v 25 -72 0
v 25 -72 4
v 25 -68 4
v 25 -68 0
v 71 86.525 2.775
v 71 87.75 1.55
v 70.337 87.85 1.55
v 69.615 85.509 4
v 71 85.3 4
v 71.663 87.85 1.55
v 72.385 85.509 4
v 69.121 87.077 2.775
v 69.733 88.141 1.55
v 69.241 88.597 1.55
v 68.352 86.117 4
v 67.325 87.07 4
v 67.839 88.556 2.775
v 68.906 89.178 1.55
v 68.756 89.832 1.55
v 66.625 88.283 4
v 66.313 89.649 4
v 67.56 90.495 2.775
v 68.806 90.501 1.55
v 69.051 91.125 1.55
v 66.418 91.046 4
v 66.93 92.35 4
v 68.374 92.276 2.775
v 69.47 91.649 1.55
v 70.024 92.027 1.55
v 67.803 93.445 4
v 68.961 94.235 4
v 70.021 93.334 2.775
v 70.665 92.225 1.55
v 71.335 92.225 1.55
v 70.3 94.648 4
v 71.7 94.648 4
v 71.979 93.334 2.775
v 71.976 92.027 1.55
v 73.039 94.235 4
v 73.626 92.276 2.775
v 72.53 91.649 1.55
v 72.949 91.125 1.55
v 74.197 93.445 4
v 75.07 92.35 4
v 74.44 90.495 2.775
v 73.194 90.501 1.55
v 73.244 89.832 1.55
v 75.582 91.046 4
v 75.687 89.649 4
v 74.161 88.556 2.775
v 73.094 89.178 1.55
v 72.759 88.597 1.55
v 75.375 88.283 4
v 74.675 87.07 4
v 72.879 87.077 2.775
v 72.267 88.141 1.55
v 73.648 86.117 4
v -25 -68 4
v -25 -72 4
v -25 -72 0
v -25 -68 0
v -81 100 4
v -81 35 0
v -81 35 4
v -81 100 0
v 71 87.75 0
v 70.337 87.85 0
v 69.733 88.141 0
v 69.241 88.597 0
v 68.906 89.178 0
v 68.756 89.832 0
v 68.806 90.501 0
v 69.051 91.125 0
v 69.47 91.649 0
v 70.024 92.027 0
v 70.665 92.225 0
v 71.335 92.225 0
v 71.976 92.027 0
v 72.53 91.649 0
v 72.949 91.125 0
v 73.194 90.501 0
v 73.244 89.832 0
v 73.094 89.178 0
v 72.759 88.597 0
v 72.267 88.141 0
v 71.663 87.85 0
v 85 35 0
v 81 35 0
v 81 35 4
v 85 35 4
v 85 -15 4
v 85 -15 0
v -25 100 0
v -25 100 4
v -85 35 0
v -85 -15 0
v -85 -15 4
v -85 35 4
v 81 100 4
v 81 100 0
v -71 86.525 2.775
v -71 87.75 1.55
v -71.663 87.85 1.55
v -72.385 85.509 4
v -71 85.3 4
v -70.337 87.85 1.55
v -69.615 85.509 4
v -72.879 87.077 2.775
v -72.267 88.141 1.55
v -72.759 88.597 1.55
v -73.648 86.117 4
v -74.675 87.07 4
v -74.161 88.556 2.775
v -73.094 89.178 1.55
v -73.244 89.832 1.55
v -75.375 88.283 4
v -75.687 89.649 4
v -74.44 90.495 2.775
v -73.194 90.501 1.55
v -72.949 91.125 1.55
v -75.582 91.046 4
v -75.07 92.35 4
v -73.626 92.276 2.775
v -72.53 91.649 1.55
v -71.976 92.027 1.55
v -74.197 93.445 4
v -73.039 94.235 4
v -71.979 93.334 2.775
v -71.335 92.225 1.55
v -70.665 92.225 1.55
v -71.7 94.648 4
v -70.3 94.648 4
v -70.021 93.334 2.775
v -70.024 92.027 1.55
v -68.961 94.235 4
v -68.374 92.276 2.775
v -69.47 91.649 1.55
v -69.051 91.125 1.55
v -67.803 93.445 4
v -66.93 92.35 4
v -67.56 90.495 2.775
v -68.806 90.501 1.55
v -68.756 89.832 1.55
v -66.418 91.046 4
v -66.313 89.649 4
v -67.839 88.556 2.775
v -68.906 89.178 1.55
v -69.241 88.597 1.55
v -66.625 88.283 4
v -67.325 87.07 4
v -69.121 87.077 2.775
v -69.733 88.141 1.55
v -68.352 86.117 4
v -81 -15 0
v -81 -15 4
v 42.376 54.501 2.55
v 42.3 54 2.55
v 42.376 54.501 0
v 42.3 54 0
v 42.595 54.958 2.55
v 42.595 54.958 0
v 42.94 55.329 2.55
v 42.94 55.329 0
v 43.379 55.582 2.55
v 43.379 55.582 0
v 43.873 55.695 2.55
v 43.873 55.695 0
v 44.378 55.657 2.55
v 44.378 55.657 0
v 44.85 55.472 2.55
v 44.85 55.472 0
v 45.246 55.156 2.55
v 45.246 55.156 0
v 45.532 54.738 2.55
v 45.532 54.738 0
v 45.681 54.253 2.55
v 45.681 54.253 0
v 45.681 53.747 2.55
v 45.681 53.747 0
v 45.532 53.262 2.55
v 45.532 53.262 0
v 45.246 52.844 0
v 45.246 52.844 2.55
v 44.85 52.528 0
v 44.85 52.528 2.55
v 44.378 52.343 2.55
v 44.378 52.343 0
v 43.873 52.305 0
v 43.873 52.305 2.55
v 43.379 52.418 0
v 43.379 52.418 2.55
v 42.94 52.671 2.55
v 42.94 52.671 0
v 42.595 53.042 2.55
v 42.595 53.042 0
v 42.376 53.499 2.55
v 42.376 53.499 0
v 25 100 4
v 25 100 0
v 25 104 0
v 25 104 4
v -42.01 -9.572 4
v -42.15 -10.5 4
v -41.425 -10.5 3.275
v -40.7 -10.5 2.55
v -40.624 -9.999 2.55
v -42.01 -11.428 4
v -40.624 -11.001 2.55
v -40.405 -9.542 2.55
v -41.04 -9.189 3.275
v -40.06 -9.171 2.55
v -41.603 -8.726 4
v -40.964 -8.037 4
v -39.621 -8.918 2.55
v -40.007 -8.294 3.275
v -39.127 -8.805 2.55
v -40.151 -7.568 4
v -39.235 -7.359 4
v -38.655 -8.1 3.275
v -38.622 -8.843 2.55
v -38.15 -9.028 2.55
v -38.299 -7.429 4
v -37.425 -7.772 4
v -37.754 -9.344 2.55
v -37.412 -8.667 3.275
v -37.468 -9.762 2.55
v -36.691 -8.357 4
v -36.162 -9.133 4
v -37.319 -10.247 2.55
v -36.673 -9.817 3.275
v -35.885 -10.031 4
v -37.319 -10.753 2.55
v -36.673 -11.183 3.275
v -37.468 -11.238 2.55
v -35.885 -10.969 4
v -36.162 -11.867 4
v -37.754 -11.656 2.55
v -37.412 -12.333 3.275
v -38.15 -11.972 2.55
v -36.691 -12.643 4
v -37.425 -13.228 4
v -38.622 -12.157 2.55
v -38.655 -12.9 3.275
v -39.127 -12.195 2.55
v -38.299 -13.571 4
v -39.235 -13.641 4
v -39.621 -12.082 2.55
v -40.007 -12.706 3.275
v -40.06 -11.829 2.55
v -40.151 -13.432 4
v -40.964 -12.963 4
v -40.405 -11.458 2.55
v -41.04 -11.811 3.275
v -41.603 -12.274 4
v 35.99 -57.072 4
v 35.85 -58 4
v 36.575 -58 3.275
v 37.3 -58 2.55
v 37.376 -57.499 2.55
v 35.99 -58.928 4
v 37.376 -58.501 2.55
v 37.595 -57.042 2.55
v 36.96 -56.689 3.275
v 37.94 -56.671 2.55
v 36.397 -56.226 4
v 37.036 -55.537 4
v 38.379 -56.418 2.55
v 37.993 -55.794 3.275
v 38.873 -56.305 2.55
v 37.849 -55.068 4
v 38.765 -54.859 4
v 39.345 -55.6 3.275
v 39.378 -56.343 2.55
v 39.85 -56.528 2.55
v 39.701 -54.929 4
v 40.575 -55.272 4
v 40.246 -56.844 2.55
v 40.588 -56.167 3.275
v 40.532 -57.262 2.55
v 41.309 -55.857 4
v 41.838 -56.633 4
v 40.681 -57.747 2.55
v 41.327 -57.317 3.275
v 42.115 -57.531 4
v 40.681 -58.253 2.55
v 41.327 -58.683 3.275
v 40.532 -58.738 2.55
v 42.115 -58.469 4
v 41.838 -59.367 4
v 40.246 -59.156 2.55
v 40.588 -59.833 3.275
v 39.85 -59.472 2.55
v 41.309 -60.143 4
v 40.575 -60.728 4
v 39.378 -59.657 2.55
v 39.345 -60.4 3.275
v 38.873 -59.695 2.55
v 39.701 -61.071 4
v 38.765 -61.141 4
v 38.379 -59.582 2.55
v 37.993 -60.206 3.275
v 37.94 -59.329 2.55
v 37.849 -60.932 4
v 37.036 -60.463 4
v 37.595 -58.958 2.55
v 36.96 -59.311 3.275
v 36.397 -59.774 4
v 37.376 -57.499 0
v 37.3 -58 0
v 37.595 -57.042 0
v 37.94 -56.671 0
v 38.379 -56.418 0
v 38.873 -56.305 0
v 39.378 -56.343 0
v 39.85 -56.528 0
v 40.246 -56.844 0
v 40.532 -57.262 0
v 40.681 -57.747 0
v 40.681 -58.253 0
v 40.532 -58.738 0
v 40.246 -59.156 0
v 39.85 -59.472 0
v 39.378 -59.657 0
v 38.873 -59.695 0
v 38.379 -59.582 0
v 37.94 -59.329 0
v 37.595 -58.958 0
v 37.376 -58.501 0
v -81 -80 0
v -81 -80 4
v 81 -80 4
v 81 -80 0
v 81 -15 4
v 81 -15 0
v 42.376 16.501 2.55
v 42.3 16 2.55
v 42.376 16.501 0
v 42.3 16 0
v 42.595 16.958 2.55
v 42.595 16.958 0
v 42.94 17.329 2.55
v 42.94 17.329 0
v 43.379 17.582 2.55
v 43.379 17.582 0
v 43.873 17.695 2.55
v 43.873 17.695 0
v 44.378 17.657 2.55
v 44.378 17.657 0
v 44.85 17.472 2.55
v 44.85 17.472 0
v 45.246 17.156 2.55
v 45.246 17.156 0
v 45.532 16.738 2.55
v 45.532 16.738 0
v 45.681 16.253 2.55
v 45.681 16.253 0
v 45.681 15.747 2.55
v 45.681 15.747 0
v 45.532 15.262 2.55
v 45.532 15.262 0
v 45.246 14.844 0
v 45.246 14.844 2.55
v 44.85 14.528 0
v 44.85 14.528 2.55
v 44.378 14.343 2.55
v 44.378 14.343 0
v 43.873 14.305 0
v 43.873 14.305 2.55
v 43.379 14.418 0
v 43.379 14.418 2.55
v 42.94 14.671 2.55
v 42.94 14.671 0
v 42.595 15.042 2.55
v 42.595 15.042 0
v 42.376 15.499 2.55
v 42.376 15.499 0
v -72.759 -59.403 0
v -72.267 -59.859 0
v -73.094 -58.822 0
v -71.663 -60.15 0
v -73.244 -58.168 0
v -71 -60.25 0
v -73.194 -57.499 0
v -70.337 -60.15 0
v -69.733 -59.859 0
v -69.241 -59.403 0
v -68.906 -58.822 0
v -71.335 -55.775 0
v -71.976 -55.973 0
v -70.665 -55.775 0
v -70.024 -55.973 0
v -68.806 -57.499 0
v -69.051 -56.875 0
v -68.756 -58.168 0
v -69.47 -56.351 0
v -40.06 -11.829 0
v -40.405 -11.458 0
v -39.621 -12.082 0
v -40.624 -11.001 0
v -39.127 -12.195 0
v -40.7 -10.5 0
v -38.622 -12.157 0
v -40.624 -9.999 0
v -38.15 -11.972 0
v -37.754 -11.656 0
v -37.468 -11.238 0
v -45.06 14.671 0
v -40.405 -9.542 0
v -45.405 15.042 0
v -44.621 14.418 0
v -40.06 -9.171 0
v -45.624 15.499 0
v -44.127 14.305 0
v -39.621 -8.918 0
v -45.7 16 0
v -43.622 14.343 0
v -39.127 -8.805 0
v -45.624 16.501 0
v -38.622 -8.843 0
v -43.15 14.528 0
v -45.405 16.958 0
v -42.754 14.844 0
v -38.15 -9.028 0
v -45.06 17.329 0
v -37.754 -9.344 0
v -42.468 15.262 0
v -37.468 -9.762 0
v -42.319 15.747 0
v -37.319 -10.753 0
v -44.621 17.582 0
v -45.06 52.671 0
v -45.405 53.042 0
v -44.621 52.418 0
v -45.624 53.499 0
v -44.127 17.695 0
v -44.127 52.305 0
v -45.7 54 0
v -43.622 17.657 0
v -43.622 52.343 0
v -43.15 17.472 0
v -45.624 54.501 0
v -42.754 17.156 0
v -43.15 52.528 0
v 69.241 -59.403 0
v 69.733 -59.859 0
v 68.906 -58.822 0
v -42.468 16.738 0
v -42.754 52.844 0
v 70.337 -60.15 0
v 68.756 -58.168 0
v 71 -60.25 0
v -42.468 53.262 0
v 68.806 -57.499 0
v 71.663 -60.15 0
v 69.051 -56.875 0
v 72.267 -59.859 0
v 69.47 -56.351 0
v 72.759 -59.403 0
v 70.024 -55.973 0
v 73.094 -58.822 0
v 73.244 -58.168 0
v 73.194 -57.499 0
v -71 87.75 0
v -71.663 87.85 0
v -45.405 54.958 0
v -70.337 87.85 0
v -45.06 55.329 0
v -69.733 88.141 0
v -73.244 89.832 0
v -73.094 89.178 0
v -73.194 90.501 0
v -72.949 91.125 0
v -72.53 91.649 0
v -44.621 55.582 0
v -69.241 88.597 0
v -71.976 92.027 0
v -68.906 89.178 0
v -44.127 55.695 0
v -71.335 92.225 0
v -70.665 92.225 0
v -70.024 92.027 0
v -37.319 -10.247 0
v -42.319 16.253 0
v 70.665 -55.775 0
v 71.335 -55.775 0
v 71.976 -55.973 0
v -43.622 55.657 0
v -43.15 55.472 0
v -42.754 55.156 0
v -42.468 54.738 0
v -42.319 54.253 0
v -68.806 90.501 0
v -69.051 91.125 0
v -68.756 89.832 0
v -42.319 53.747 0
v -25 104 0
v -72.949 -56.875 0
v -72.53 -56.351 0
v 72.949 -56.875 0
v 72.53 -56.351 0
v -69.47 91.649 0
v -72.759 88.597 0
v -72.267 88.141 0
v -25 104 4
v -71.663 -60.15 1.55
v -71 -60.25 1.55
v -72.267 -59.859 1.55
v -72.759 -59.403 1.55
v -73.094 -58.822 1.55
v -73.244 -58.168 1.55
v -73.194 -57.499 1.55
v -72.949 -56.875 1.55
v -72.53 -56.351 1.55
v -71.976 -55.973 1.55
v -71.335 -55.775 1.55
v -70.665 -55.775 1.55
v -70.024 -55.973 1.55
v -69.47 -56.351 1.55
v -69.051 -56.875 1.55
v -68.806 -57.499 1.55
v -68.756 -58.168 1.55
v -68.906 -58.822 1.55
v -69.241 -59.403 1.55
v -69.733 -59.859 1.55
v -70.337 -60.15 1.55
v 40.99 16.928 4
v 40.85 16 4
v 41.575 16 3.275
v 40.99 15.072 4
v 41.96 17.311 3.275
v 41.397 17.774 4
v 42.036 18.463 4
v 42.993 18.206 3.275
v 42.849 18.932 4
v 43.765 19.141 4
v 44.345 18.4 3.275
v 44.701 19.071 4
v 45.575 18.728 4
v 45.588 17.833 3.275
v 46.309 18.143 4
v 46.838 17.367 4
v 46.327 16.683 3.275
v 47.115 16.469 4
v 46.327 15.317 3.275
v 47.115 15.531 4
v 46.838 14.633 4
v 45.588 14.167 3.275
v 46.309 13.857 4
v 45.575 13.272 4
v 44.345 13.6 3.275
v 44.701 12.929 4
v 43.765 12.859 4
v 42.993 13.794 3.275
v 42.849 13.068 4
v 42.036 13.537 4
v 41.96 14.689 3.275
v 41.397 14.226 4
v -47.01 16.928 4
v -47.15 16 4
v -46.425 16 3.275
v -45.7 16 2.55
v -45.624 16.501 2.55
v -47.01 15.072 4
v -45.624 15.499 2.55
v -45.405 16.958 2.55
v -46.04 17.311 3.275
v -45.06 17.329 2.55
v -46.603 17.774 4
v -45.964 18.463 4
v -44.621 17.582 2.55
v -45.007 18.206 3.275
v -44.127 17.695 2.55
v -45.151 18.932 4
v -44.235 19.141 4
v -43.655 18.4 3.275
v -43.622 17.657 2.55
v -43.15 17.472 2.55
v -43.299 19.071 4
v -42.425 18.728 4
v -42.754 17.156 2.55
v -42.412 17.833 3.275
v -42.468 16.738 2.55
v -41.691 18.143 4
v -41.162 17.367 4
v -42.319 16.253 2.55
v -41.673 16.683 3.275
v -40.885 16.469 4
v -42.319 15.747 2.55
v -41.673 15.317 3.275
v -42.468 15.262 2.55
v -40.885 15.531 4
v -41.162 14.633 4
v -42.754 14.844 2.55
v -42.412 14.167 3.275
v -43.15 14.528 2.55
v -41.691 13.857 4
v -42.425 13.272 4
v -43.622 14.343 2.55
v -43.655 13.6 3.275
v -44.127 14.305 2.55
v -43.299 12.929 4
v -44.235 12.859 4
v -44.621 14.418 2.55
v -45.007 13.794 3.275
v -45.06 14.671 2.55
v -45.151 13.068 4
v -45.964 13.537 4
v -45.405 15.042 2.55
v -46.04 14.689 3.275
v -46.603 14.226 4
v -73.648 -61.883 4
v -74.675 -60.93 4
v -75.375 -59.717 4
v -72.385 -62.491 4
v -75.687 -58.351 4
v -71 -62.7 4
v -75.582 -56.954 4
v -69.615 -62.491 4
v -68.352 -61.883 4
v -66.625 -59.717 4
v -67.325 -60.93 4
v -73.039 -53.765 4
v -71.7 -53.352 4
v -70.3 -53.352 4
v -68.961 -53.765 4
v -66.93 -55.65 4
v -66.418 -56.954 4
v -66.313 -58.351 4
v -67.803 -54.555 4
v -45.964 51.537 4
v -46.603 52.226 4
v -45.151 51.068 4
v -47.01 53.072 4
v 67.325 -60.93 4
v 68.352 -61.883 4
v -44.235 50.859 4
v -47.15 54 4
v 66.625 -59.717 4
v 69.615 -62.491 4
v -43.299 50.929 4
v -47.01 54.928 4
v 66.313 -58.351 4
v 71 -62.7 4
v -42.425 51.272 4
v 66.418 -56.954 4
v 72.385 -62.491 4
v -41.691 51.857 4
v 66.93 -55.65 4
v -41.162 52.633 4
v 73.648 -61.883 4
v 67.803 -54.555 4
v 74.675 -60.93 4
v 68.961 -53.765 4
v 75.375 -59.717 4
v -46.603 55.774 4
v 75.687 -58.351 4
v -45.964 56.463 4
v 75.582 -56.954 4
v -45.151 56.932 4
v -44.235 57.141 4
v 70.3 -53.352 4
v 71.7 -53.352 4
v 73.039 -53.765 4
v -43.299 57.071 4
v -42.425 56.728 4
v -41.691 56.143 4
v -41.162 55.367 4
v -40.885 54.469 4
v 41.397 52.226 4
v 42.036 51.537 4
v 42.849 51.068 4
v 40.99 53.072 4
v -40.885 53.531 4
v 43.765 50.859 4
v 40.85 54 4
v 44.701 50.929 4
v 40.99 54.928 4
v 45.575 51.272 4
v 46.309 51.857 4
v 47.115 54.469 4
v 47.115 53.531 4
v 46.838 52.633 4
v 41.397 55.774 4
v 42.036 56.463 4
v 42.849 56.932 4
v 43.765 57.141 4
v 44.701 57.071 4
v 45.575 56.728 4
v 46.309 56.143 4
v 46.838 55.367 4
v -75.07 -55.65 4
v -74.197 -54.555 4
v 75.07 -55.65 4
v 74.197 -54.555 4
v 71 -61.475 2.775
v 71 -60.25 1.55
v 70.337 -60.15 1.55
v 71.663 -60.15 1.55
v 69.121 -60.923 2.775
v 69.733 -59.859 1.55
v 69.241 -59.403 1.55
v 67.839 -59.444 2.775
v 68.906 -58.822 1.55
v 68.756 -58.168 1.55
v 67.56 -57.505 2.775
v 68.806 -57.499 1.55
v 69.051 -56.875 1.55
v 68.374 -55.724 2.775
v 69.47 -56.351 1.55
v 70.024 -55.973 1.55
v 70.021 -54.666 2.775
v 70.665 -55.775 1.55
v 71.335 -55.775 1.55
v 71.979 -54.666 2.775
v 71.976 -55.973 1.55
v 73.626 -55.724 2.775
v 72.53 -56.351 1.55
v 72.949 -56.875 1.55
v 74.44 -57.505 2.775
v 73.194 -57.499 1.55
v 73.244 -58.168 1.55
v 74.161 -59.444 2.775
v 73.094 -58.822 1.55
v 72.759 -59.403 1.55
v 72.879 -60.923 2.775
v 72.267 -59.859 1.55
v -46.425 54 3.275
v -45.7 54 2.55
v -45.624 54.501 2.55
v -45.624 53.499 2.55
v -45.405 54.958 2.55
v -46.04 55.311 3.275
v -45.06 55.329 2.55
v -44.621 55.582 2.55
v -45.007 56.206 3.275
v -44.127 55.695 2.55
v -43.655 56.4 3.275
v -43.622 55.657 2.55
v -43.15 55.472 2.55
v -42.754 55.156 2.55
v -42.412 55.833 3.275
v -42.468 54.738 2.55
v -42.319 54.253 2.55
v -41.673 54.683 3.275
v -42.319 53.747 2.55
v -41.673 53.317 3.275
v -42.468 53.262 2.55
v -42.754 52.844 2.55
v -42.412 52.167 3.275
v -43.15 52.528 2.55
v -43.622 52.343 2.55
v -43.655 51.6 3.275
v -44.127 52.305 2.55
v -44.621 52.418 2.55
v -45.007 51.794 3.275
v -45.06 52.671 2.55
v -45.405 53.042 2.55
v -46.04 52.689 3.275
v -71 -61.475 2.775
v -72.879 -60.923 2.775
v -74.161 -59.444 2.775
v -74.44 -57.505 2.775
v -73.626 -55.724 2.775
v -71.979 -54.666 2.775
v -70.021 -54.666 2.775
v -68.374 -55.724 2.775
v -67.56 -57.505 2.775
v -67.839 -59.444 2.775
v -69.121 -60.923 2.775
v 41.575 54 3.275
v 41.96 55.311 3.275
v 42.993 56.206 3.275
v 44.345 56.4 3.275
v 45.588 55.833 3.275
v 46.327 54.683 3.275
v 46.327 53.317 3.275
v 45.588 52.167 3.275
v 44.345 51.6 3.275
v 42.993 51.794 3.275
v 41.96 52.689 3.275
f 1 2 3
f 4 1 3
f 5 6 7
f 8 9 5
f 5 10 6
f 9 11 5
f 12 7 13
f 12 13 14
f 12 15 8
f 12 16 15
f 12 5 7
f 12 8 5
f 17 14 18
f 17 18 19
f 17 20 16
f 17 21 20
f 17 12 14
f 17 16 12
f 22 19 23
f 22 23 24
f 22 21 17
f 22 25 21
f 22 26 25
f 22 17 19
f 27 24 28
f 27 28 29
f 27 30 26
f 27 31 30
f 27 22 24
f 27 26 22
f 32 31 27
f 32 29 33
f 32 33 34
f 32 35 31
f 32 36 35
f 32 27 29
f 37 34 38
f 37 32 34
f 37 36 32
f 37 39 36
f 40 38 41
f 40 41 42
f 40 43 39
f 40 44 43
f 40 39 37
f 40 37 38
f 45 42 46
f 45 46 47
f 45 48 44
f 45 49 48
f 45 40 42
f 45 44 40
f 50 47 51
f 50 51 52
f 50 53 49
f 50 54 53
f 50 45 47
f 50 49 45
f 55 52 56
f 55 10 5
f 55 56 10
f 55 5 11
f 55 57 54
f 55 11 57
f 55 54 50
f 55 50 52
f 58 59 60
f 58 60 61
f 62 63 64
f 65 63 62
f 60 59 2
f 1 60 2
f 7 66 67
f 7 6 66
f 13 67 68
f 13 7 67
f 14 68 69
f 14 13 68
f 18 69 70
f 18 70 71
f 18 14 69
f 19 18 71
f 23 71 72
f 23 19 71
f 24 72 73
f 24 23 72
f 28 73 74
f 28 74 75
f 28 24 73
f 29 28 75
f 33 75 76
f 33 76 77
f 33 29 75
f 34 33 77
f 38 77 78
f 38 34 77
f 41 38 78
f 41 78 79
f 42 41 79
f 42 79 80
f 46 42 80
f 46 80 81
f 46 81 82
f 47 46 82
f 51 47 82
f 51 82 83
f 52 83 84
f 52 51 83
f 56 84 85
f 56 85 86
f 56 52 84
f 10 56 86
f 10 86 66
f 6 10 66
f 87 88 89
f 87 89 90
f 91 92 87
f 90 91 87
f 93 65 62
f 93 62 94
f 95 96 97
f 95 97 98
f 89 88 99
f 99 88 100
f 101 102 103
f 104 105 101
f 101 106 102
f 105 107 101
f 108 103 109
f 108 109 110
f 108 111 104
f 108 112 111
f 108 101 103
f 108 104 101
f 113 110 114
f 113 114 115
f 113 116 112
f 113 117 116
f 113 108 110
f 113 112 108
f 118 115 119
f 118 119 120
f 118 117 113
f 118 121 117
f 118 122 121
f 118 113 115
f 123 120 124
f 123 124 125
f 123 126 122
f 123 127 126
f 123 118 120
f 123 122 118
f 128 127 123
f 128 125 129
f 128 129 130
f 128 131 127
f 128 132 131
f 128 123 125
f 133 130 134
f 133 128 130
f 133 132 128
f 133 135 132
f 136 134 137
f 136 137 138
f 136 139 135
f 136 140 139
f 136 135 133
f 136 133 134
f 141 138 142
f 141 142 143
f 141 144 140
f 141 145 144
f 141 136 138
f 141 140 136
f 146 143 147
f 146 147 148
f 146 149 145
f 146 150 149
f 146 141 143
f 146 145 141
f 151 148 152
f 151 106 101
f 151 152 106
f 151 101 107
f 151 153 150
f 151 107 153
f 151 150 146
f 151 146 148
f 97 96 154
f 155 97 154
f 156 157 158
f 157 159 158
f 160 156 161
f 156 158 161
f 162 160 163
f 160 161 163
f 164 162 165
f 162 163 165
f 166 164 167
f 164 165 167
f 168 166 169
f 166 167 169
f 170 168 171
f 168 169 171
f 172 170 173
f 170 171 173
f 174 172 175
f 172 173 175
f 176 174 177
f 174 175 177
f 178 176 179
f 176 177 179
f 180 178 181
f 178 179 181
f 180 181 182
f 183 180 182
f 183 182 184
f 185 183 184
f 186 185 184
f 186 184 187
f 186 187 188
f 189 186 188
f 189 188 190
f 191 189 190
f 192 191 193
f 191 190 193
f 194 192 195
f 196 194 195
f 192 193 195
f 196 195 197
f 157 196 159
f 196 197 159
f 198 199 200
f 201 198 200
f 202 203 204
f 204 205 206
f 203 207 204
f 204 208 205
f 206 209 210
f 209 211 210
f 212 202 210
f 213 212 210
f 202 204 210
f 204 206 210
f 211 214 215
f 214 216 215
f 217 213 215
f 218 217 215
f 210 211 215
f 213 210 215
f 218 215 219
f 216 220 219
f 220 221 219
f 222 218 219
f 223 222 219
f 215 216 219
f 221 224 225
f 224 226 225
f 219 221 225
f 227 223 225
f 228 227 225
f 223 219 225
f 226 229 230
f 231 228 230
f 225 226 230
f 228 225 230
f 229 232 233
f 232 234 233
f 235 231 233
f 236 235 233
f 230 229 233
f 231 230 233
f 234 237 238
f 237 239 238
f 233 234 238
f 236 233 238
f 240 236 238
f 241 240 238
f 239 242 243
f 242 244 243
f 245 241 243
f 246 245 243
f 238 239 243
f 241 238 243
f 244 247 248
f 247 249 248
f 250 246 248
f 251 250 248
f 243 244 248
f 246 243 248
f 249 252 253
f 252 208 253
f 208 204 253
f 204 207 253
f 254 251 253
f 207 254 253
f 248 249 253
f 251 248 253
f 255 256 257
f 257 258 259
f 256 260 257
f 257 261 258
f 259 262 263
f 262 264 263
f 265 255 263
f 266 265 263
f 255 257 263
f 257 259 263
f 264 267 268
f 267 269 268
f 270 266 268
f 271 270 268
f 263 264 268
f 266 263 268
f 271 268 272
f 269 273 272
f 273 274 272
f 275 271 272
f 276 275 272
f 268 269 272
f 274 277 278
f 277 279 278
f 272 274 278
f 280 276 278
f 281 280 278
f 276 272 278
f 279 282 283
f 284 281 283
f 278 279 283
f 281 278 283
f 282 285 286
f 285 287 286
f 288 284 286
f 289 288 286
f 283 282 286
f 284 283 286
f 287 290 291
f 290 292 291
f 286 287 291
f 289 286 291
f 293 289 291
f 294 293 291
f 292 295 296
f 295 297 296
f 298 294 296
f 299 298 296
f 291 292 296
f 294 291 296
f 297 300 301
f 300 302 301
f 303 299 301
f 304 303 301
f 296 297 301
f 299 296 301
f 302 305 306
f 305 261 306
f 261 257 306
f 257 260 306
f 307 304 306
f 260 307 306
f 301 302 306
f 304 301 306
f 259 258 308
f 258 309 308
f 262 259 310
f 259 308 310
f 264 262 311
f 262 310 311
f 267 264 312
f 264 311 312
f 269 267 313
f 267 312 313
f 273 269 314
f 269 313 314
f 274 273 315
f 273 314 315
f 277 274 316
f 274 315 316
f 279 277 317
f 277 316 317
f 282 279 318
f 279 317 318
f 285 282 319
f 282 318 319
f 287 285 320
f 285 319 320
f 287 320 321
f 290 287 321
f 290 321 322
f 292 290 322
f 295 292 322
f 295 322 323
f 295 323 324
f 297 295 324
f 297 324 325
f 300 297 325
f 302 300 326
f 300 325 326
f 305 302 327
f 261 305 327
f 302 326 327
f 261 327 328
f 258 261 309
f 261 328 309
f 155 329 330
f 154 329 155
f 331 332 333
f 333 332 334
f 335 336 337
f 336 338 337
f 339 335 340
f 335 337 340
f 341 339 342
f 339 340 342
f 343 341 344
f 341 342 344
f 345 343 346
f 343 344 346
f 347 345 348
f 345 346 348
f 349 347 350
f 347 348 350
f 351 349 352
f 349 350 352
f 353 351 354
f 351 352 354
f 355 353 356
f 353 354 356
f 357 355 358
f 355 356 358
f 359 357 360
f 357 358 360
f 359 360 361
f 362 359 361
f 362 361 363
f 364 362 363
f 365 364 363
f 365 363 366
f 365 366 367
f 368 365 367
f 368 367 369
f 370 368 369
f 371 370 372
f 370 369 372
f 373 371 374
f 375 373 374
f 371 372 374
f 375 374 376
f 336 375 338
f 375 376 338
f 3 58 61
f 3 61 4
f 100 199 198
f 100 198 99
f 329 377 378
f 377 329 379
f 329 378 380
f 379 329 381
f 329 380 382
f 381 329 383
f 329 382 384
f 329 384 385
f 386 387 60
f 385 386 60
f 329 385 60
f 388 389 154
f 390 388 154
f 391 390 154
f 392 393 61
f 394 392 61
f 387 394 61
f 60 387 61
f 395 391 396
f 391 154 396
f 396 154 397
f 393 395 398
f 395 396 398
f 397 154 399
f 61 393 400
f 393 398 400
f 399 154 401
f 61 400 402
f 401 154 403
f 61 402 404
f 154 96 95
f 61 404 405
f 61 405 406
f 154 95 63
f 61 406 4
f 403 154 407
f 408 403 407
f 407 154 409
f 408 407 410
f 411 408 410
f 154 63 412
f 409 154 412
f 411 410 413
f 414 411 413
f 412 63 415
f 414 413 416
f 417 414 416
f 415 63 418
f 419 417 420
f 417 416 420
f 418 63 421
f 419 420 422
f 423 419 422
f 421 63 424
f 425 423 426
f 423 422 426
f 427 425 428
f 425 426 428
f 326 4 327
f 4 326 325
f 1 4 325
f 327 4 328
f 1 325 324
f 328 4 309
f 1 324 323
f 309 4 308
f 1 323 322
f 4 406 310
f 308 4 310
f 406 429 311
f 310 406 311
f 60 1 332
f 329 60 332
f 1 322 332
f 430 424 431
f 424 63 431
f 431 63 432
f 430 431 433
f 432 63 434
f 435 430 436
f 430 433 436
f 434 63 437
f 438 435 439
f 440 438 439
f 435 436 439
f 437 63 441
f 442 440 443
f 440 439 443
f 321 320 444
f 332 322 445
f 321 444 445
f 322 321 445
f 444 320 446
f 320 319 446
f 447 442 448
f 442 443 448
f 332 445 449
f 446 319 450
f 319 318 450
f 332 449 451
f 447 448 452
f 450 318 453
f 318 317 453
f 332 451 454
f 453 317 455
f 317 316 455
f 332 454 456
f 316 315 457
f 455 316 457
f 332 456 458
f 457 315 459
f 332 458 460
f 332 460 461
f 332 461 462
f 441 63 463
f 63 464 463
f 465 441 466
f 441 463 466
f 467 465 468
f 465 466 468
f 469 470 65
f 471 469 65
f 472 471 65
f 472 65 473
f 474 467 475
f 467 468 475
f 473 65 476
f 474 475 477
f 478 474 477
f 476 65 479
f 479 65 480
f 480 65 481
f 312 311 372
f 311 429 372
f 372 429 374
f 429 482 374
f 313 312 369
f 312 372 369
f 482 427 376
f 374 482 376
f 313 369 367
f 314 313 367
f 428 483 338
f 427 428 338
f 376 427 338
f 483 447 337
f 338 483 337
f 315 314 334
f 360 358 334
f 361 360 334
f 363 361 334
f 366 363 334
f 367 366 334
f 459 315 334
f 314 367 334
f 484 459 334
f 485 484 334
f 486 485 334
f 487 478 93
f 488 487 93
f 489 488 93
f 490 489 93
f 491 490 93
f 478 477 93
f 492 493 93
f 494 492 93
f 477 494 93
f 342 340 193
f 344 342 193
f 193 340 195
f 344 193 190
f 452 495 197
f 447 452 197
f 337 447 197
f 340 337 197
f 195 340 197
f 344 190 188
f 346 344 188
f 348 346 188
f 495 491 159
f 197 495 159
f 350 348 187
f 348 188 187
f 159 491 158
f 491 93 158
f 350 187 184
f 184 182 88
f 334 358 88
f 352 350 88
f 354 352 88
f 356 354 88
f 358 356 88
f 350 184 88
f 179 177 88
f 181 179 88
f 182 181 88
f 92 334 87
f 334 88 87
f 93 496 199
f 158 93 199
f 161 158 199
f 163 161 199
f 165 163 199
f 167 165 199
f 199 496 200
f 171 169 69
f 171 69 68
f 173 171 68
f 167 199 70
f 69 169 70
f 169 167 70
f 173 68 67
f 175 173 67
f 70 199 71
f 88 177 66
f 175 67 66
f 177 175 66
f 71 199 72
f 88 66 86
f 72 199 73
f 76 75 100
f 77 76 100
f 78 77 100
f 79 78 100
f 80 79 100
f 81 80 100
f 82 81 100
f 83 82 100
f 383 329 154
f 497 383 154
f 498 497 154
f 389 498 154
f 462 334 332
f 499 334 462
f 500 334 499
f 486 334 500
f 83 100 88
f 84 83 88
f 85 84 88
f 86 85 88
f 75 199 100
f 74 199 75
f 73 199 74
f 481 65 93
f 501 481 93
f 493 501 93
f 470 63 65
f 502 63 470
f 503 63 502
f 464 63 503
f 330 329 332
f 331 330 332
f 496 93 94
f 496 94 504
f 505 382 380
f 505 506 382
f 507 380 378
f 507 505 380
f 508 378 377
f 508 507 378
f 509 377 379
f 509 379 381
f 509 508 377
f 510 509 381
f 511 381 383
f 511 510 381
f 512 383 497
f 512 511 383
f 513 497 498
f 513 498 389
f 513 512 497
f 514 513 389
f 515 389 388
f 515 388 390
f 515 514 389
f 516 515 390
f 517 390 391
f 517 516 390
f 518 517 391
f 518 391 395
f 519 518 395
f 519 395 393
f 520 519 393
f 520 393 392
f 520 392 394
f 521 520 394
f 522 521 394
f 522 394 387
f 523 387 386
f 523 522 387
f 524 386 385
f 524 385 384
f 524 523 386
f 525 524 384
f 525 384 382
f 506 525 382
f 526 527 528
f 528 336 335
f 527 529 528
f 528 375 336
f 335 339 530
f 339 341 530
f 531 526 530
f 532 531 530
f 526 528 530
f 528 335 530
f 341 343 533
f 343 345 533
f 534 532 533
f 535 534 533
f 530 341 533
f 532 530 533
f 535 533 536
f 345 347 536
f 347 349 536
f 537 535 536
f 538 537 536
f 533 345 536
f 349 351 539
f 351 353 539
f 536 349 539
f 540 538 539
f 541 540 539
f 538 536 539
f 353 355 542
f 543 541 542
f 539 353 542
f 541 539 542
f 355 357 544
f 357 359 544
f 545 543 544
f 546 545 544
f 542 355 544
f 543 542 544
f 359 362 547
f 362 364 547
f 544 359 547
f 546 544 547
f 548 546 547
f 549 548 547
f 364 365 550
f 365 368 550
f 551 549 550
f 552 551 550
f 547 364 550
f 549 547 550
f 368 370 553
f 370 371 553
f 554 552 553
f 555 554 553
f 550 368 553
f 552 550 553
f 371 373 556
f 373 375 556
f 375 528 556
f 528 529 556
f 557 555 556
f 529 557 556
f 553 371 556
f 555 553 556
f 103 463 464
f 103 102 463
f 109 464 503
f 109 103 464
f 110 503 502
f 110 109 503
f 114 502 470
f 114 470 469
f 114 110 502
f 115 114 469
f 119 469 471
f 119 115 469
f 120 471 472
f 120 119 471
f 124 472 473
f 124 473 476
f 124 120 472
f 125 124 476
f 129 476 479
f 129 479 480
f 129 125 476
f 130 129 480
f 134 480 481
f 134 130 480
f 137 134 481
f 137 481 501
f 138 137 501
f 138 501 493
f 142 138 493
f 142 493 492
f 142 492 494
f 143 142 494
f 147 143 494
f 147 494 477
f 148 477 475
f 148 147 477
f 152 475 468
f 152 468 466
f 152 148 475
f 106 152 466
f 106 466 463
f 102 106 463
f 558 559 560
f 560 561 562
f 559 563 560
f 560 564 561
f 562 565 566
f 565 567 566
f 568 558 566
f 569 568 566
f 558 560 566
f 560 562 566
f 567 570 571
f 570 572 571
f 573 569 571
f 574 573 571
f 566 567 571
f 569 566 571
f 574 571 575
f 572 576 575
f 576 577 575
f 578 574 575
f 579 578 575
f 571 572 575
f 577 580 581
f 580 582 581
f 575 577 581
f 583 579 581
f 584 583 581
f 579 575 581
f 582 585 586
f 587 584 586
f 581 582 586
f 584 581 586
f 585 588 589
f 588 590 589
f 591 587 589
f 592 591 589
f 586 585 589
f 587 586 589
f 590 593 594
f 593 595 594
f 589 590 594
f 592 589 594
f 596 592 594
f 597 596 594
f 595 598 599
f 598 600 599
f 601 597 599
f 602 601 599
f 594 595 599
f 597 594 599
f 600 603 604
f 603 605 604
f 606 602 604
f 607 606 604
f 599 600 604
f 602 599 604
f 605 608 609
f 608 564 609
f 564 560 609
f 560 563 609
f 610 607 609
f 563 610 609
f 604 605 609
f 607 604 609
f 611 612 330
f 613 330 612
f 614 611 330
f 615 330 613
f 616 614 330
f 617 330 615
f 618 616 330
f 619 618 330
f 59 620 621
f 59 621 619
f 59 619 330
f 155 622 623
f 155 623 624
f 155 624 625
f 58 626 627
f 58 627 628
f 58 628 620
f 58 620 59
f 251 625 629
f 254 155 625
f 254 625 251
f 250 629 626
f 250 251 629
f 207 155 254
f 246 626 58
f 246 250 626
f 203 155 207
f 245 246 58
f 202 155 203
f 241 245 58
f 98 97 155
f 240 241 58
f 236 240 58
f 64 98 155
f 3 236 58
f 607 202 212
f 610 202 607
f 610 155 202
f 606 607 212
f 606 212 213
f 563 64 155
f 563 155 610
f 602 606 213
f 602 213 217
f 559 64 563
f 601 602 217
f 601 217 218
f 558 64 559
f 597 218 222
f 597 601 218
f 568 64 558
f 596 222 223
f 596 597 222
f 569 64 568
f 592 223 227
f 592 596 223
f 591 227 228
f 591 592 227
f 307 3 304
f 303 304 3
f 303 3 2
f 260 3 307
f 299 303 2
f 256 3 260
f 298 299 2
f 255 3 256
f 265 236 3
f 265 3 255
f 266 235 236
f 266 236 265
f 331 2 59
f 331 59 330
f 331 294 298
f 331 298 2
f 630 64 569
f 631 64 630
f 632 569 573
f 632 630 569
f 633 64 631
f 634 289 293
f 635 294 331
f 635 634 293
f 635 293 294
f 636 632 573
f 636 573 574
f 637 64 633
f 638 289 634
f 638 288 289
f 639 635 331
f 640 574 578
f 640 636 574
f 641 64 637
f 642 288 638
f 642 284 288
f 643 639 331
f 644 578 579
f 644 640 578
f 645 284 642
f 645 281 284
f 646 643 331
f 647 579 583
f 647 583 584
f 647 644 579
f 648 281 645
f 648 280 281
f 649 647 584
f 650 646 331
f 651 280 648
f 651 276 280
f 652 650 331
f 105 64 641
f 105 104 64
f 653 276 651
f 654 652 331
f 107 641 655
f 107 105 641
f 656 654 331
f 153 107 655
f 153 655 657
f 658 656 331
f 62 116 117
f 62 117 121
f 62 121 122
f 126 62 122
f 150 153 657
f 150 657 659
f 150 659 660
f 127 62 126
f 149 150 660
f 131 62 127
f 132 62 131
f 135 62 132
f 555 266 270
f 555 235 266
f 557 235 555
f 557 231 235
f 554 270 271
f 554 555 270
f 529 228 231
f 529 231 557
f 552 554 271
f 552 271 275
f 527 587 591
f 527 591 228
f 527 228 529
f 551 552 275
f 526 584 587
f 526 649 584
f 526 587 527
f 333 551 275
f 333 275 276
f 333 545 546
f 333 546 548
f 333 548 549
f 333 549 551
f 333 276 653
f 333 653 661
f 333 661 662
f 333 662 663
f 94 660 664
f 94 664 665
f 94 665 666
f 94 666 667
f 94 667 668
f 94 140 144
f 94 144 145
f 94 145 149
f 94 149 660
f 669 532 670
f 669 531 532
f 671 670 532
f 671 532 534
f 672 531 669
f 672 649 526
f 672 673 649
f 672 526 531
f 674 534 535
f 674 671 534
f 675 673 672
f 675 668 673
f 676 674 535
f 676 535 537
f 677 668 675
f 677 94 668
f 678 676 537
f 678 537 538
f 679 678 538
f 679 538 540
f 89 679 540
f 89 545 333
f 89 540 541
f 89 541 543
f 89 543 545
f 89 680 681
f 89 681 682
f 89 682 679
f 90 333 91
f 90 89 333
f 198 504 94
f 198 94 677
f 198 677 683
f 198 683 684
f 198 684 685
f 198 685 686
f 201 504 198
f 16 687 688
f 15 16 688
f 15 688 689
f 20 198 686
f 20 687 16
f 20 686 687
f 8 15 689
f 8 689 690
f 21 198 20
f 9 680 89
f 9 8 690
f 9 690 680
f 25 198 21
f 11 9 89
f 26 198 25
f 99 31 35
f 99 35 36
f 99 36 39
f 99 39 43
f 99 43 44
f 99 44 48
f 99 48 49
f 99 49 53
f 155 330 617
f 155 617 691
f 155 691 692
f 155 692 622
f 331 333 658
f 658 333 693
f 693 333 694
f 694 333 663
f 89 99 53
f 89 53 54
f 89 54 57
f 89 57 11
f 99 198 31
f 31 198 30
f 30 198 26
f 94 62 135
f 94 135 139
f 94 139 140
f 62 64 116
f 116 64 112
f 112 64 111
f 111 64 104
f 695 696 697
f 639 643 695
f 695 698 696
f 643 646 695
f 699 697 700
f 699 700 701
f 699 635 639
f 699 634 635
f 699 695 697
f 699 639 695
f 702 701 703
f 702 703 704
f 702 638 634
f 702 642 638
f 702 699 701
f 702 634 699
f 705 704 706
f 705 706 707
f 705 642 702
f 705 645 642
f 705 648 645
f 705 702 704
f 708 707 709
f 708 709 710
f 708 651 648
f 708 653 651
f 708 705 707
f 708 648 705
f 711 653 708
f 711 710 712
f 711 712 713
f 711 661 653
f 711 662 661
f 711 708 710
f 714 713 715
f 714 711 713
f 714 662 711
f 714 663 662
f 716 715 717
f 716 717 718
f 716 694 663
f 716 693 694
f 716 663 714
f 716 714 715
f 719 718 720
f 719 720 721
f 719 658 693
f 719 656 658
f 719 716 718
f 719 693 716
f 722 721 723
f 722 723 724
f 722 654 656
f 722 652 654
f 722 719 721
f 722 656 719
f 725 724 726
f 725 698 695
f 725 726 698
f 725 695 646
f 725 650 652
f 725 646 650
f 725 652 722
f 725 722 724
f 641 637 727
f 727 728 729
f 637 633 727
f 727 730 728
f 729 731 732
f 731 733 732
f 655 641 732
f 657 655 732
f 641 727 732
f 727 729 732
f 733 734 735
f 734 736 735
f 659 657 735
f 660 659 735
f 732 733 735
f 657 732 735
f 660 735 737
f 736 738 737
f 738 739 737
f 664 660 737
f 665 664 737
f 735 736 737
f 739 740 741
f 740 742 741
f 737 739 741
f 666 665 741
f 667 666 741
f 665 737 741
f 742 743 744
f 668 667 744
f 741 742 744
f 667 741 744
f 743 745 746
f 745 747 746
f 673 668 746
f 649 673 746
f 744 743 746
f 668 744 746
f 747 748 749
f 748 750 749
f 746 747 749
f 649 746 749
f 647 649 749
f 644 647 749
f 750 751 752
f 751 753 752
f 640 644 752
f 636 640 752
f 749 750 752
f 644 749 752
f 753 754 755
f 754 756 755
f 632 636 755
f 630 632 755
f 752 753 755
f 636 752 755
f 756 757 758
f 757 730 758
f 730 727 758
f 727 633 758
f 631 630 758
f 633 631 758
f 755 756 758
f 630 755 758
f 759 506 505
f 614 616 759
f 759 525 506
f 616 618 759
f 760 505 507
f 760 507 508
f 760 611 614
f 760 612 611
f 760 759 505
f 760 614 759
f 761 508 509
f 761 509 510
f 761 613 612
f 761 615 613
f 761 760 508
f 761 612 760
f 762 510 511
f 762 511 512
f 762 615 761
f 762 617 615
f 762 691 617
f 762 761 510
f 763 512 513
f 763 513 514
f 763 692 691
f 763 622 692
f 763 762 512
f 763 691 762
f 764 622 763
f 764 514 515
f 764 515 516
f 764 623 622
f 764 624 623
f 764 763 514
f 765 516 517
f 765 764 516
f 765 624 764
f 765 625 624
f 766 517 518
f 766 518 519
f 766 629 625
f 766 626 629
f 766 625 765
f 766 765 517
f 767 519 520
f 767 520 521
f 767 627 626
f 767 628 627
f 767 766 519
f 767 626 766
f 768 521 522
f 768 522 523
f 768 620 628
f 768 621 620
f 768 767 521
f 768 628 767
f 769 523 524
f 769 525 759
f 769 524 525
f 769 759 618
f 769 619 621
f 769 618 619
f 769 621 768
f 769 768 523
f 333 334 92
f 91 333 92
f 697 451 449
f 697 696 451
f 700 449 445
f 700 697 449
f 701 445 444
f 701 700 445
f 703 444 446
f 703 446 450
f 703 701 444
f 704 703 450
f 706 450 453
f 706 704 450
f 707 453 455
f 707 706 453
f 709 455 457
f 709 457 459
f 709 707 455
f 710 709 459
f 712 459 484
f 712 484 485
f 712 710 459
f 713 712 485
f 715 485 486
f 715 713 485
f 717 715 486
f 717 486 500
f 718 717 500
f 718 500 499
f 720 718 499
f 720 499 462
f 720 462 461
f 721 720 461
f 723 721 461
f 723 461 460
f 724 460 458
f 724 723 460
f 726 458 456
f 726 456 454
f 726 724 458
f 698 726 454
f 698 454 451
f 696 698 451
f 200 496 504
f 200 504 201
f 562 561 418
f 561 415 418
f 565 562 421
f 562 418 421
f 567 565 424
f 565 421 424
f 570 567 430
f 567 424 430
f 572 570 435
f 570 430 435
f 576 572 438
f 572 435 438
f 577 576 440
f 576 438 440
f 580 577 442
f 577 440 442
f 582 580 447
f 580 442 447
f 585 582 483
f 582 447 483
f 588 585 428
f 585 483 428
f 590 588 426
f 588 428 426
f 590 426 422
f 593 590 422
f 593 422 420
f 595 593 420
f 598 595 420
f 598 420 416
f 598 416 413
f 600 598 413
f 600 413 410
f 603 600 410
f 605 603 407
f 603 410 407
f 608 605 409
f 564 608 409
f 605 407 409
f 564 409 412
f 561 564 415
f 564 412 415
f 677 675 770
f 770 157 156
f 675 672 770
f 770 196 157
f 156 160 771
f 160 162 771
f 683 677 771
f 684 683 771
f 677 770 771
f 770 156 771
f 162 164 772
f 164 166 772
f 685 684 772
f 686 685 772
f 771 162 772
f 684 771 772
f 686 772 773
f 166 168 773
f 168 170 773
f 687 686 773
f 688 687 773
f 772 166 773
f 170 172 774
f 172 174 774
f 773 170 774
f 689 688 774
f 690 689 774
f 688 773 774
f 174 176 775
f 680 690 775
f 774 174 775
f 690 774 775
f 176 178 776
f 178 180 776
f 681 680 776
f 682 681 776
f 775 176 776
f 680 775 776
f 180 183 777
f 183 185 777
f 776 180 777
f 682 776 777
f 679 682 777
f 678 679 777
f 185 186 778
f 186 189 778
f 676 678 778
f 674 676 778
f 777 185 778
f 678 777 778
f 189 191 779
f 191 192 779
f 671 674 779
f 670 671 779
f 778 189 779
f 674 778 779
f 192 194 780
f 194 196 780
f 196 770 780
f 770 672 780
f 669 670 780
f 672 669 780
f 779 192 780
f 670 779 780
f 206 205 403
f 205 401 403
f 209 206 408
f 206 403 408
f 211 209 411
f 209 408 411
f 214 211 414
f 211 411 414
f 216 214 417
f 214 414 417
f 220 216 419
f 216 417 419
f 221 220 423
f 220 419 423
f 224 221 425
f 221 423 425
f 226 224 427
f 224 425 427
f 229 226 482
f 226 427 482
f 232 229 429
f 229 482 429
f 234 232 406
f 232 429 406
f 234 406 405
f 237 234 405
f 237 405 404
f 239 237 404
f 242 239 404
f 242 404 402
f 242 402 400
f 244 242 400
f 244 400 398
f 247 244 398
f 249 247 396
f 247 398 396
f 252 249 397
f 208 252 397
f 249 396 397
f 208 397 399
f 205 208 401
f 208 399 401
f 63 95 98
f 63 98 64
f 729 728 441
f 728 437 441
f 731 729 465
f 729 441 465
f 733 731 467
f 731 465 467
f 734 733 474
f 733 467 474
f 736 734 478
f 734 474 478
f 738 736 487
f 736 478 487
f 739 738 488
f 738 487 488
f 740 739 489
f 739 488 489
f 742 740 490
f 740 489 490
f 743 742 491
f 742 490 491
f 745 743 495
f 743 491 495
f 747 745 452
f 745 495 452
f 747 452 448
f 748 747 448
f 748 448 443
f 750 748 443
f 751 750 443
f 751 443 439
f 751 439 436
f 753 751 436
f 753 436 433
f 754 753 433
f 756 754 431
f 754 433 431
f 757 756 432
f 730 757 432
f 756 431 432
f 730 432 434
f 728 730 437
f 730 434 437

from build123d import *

# Parameters (mm, degrees)
SKETCH1_W                                           = 162
SKETCH1_H                                           = 180
SKETCH1_W_2                                         = 50
SKETCH1_H_2                                         = 4
SKETCH1_W_3                                         = 4
SKETCH1_H_3                                         = 50
BOSS_EXTRUDE2_DEPTH                                 = 4
CUT_EXTRUDE1_REACH                                  = 136.376
SKETCH2_W                                           = 50
SKETCH2_H                                           = 4
CSK_FOR_M3_COUNTERSUNK_FLAT_HEAD_SCREW1_D           = 3.4
CSK_FOR_M3_COUNTERSUNK_FLAT_HEAD_SCREW1_CSINK_D     = 6.3
CSK_FOR_M3_COUNTERSUNK_FLAT_HEAD_SCREW1_CSINK_ANGLE = 90
CSK_FOR_M4_COUNTERSUNK_FLAT_HEAD_SCR_2_COUNT        = 2
CSK_FOR_M4_COUNTERSUNK_FLAT_HEAD_SCR_2_PITCH        = 142
CSK_FOR_M4_COUNTERSUNK_FLAT_HEAD_SCR_3_COUNT        = 2
CSK_FOR_M4_COUNTERSUNK_FLAT_HEAD_SCR_3_PITCH        = 205.104851235
CSK_FOR_M4_COUNTERSUNK_FLAT_HEAD_SCR_4_COUNT        = 2
CSK_FOR_M4_COUNTERSUNK_FLAT_HEAD_SCR_4_PITCH        = 148
CSK_FOR_M3_COUNTERSUNK_FLAT_HEAD_SCREW3_D           = 3.4
CSK_FOR_M3_COUNTERSUNK_FLAT_HEAD_SCREW3_CSINK_D     = 6.3
CSK_FOR_M3_COUNTERSUNK_FLAT_HEAD_SCREW3_CSINK_ANGLE = 90


with BuildPart() as part:
    # Sketch1 → Boss-Extrude2 (new body)
    with BuildSketch(Plane.XY):
        with Locations((0, 10)):
            Rectangle(SKETCH1_W, SKETCH1_H)
        with Locations((0, 102)):
            Rectangle(SKETCH1_W_2, SKETCH1_H_2)
        with Locations((83, 10)):
            Rectangle(SKETCH1_W_3, SKETCH1_H_3)
        with Locations((-83, 10)):
            Rectangle(SKETCH1_W_3, SKETCH1_H_3)
    extrude(amount=BOSS_EXTRUDE2_DEPTH)

    # Sketch2 → Cut-Extrude1 (cut, up to next)
    with BuildSketch(Plane.XY.offset(4), mode=Mode.PRIVATE) as cut_extrude1_sk1:
        with Locations((0, -70)):
            Rectangle(SKETCH2_W, SKETCH2_H)
    cut_extrude1_tool1 = extrude(cut_extrude1_sk1.sketch, amount=-CUT_EXTRUDE1_REACH, mode=Mode.PRIVATE) & part.part
    add(cut_extrude1_tool1.solids().sort_by_distance((0, -70, 4))[0], mode=Mode.SUBTRACT)

    # CSK for M3 Countersunk Flat Head Screw1 (through all)
    with Locations(Plane(origin=(-44, 54, 4), x_dir=(1, 0, 0), z_dir=(0, 0, 1))):
        with Locations((0, 0), (88, 0), (88, -38), (0, -38)):
            CounterSinkHole(CSK_FOR_M3_COUNTERSUNK_FLAT_HEAD_SCREW1_D / 2, CSK_FOR_M3_COUNTERSUNK_FLAT_HEAD_SCREW1_CSINK_D / 2, counter_sink_angle=CSK_FOR_M3_COUNTERSUNK_FLAT_HEAD_SCREW1_CSINK_ANGLE)

    # Sketch6 → CSK for M4 Countersunk Flat Head Screw1 (revolve, cut)
    with BuildSketch(Plane(origin=(-71, 90, 4), x_dir=(0, -1, 0), z_dir=(1, 0, 0))):
        Polygon((0, 0), (0, 4), (2.25, 4), (2.25, 2.45), (4.7, 0), align=None)
    csk_for_m4_countersunk_flat_head_screw1 = revolve(axis=Axis((-71, 90, 10.35), (0, 0, -1)), mode=Mode.SUBTRACT)

    # CSK for M4 Countersunk Flat Head Scr 2: CSK for M4 Countersunk Flat Head Screw1 ×2
    with Locations(*[(i * CSK_FOR_M4_COUNTERSUNK_FLAT_HEAD_SCR_2_PITCH, 0, 0) for i in range(1, CSK_FOR_M4_COUNTERSUNK_FLAT_HEAD_SCR_2_COUNT)]):
        add(csk_for_m4_countersunk_flat_head_screw1, mode=Mode.SUBTRACT)

    # CSK for M4 Countersunk Flat Head Scr 3: CSK for M4 Countersunk Flat Head Screw1 ×2
    with Locations(*[Vector(0.6923288217962463, -0.7215821522946791, 0) * (i * CSK_FOR_M4_COUNTERSUNK_FLAT_HEAD_SCR_3_PITCH) for i in range(1, CSK_FOR_M4_COUNTERSUNK_FLAT_HEAD_SCR_3_COUNT)]):
        add(csk_for_m4_countersunk_flat_head_screw1, mode=Mode.SUBTRACT)

    # CSK for M4 Countersunk Flat Head Scr 4: CSK for M4 Countersunk Flat Head Screw1 ×2
    with Locations(*[(0, -i * CSK_FOR_M4_COUNTERSUNK_FLAT_HEAD_SCR_4_PITCH, 0) for i in range(1, CSK_FOR_M4_COUNTERSUNK_FLAT_HEAD_SCR_4_COUNT)]):
        add(csk_for_m4_countersunk_flat_head_screw1, mode=Mode.SUBTRACT)

    # CSK for M3 Countersunk Flat Head Screw3 (through all)
    with Locations(Plane(origin=(-39, -10.5, 4), x_dir=(1, 0, 0), z_dir=(0, 0, 1))):
        with Locations((0, 0), (78, -47.5)):
            CounterSinkHole(CSK_FOR_M3_COUNTERSUNK_FLAT_HEAD_SCREW3_D / 2, CSK_FOR_M3_COUNTERSUNK_FLAT_HEAD_SCREW3_CSINK_D / 2, counter_sink_angle=CSK_FOR_M3_COUNTERSUNK_FLAT_HEAD_SCREW3_CSINK_ANGLE)


solid = part.part
